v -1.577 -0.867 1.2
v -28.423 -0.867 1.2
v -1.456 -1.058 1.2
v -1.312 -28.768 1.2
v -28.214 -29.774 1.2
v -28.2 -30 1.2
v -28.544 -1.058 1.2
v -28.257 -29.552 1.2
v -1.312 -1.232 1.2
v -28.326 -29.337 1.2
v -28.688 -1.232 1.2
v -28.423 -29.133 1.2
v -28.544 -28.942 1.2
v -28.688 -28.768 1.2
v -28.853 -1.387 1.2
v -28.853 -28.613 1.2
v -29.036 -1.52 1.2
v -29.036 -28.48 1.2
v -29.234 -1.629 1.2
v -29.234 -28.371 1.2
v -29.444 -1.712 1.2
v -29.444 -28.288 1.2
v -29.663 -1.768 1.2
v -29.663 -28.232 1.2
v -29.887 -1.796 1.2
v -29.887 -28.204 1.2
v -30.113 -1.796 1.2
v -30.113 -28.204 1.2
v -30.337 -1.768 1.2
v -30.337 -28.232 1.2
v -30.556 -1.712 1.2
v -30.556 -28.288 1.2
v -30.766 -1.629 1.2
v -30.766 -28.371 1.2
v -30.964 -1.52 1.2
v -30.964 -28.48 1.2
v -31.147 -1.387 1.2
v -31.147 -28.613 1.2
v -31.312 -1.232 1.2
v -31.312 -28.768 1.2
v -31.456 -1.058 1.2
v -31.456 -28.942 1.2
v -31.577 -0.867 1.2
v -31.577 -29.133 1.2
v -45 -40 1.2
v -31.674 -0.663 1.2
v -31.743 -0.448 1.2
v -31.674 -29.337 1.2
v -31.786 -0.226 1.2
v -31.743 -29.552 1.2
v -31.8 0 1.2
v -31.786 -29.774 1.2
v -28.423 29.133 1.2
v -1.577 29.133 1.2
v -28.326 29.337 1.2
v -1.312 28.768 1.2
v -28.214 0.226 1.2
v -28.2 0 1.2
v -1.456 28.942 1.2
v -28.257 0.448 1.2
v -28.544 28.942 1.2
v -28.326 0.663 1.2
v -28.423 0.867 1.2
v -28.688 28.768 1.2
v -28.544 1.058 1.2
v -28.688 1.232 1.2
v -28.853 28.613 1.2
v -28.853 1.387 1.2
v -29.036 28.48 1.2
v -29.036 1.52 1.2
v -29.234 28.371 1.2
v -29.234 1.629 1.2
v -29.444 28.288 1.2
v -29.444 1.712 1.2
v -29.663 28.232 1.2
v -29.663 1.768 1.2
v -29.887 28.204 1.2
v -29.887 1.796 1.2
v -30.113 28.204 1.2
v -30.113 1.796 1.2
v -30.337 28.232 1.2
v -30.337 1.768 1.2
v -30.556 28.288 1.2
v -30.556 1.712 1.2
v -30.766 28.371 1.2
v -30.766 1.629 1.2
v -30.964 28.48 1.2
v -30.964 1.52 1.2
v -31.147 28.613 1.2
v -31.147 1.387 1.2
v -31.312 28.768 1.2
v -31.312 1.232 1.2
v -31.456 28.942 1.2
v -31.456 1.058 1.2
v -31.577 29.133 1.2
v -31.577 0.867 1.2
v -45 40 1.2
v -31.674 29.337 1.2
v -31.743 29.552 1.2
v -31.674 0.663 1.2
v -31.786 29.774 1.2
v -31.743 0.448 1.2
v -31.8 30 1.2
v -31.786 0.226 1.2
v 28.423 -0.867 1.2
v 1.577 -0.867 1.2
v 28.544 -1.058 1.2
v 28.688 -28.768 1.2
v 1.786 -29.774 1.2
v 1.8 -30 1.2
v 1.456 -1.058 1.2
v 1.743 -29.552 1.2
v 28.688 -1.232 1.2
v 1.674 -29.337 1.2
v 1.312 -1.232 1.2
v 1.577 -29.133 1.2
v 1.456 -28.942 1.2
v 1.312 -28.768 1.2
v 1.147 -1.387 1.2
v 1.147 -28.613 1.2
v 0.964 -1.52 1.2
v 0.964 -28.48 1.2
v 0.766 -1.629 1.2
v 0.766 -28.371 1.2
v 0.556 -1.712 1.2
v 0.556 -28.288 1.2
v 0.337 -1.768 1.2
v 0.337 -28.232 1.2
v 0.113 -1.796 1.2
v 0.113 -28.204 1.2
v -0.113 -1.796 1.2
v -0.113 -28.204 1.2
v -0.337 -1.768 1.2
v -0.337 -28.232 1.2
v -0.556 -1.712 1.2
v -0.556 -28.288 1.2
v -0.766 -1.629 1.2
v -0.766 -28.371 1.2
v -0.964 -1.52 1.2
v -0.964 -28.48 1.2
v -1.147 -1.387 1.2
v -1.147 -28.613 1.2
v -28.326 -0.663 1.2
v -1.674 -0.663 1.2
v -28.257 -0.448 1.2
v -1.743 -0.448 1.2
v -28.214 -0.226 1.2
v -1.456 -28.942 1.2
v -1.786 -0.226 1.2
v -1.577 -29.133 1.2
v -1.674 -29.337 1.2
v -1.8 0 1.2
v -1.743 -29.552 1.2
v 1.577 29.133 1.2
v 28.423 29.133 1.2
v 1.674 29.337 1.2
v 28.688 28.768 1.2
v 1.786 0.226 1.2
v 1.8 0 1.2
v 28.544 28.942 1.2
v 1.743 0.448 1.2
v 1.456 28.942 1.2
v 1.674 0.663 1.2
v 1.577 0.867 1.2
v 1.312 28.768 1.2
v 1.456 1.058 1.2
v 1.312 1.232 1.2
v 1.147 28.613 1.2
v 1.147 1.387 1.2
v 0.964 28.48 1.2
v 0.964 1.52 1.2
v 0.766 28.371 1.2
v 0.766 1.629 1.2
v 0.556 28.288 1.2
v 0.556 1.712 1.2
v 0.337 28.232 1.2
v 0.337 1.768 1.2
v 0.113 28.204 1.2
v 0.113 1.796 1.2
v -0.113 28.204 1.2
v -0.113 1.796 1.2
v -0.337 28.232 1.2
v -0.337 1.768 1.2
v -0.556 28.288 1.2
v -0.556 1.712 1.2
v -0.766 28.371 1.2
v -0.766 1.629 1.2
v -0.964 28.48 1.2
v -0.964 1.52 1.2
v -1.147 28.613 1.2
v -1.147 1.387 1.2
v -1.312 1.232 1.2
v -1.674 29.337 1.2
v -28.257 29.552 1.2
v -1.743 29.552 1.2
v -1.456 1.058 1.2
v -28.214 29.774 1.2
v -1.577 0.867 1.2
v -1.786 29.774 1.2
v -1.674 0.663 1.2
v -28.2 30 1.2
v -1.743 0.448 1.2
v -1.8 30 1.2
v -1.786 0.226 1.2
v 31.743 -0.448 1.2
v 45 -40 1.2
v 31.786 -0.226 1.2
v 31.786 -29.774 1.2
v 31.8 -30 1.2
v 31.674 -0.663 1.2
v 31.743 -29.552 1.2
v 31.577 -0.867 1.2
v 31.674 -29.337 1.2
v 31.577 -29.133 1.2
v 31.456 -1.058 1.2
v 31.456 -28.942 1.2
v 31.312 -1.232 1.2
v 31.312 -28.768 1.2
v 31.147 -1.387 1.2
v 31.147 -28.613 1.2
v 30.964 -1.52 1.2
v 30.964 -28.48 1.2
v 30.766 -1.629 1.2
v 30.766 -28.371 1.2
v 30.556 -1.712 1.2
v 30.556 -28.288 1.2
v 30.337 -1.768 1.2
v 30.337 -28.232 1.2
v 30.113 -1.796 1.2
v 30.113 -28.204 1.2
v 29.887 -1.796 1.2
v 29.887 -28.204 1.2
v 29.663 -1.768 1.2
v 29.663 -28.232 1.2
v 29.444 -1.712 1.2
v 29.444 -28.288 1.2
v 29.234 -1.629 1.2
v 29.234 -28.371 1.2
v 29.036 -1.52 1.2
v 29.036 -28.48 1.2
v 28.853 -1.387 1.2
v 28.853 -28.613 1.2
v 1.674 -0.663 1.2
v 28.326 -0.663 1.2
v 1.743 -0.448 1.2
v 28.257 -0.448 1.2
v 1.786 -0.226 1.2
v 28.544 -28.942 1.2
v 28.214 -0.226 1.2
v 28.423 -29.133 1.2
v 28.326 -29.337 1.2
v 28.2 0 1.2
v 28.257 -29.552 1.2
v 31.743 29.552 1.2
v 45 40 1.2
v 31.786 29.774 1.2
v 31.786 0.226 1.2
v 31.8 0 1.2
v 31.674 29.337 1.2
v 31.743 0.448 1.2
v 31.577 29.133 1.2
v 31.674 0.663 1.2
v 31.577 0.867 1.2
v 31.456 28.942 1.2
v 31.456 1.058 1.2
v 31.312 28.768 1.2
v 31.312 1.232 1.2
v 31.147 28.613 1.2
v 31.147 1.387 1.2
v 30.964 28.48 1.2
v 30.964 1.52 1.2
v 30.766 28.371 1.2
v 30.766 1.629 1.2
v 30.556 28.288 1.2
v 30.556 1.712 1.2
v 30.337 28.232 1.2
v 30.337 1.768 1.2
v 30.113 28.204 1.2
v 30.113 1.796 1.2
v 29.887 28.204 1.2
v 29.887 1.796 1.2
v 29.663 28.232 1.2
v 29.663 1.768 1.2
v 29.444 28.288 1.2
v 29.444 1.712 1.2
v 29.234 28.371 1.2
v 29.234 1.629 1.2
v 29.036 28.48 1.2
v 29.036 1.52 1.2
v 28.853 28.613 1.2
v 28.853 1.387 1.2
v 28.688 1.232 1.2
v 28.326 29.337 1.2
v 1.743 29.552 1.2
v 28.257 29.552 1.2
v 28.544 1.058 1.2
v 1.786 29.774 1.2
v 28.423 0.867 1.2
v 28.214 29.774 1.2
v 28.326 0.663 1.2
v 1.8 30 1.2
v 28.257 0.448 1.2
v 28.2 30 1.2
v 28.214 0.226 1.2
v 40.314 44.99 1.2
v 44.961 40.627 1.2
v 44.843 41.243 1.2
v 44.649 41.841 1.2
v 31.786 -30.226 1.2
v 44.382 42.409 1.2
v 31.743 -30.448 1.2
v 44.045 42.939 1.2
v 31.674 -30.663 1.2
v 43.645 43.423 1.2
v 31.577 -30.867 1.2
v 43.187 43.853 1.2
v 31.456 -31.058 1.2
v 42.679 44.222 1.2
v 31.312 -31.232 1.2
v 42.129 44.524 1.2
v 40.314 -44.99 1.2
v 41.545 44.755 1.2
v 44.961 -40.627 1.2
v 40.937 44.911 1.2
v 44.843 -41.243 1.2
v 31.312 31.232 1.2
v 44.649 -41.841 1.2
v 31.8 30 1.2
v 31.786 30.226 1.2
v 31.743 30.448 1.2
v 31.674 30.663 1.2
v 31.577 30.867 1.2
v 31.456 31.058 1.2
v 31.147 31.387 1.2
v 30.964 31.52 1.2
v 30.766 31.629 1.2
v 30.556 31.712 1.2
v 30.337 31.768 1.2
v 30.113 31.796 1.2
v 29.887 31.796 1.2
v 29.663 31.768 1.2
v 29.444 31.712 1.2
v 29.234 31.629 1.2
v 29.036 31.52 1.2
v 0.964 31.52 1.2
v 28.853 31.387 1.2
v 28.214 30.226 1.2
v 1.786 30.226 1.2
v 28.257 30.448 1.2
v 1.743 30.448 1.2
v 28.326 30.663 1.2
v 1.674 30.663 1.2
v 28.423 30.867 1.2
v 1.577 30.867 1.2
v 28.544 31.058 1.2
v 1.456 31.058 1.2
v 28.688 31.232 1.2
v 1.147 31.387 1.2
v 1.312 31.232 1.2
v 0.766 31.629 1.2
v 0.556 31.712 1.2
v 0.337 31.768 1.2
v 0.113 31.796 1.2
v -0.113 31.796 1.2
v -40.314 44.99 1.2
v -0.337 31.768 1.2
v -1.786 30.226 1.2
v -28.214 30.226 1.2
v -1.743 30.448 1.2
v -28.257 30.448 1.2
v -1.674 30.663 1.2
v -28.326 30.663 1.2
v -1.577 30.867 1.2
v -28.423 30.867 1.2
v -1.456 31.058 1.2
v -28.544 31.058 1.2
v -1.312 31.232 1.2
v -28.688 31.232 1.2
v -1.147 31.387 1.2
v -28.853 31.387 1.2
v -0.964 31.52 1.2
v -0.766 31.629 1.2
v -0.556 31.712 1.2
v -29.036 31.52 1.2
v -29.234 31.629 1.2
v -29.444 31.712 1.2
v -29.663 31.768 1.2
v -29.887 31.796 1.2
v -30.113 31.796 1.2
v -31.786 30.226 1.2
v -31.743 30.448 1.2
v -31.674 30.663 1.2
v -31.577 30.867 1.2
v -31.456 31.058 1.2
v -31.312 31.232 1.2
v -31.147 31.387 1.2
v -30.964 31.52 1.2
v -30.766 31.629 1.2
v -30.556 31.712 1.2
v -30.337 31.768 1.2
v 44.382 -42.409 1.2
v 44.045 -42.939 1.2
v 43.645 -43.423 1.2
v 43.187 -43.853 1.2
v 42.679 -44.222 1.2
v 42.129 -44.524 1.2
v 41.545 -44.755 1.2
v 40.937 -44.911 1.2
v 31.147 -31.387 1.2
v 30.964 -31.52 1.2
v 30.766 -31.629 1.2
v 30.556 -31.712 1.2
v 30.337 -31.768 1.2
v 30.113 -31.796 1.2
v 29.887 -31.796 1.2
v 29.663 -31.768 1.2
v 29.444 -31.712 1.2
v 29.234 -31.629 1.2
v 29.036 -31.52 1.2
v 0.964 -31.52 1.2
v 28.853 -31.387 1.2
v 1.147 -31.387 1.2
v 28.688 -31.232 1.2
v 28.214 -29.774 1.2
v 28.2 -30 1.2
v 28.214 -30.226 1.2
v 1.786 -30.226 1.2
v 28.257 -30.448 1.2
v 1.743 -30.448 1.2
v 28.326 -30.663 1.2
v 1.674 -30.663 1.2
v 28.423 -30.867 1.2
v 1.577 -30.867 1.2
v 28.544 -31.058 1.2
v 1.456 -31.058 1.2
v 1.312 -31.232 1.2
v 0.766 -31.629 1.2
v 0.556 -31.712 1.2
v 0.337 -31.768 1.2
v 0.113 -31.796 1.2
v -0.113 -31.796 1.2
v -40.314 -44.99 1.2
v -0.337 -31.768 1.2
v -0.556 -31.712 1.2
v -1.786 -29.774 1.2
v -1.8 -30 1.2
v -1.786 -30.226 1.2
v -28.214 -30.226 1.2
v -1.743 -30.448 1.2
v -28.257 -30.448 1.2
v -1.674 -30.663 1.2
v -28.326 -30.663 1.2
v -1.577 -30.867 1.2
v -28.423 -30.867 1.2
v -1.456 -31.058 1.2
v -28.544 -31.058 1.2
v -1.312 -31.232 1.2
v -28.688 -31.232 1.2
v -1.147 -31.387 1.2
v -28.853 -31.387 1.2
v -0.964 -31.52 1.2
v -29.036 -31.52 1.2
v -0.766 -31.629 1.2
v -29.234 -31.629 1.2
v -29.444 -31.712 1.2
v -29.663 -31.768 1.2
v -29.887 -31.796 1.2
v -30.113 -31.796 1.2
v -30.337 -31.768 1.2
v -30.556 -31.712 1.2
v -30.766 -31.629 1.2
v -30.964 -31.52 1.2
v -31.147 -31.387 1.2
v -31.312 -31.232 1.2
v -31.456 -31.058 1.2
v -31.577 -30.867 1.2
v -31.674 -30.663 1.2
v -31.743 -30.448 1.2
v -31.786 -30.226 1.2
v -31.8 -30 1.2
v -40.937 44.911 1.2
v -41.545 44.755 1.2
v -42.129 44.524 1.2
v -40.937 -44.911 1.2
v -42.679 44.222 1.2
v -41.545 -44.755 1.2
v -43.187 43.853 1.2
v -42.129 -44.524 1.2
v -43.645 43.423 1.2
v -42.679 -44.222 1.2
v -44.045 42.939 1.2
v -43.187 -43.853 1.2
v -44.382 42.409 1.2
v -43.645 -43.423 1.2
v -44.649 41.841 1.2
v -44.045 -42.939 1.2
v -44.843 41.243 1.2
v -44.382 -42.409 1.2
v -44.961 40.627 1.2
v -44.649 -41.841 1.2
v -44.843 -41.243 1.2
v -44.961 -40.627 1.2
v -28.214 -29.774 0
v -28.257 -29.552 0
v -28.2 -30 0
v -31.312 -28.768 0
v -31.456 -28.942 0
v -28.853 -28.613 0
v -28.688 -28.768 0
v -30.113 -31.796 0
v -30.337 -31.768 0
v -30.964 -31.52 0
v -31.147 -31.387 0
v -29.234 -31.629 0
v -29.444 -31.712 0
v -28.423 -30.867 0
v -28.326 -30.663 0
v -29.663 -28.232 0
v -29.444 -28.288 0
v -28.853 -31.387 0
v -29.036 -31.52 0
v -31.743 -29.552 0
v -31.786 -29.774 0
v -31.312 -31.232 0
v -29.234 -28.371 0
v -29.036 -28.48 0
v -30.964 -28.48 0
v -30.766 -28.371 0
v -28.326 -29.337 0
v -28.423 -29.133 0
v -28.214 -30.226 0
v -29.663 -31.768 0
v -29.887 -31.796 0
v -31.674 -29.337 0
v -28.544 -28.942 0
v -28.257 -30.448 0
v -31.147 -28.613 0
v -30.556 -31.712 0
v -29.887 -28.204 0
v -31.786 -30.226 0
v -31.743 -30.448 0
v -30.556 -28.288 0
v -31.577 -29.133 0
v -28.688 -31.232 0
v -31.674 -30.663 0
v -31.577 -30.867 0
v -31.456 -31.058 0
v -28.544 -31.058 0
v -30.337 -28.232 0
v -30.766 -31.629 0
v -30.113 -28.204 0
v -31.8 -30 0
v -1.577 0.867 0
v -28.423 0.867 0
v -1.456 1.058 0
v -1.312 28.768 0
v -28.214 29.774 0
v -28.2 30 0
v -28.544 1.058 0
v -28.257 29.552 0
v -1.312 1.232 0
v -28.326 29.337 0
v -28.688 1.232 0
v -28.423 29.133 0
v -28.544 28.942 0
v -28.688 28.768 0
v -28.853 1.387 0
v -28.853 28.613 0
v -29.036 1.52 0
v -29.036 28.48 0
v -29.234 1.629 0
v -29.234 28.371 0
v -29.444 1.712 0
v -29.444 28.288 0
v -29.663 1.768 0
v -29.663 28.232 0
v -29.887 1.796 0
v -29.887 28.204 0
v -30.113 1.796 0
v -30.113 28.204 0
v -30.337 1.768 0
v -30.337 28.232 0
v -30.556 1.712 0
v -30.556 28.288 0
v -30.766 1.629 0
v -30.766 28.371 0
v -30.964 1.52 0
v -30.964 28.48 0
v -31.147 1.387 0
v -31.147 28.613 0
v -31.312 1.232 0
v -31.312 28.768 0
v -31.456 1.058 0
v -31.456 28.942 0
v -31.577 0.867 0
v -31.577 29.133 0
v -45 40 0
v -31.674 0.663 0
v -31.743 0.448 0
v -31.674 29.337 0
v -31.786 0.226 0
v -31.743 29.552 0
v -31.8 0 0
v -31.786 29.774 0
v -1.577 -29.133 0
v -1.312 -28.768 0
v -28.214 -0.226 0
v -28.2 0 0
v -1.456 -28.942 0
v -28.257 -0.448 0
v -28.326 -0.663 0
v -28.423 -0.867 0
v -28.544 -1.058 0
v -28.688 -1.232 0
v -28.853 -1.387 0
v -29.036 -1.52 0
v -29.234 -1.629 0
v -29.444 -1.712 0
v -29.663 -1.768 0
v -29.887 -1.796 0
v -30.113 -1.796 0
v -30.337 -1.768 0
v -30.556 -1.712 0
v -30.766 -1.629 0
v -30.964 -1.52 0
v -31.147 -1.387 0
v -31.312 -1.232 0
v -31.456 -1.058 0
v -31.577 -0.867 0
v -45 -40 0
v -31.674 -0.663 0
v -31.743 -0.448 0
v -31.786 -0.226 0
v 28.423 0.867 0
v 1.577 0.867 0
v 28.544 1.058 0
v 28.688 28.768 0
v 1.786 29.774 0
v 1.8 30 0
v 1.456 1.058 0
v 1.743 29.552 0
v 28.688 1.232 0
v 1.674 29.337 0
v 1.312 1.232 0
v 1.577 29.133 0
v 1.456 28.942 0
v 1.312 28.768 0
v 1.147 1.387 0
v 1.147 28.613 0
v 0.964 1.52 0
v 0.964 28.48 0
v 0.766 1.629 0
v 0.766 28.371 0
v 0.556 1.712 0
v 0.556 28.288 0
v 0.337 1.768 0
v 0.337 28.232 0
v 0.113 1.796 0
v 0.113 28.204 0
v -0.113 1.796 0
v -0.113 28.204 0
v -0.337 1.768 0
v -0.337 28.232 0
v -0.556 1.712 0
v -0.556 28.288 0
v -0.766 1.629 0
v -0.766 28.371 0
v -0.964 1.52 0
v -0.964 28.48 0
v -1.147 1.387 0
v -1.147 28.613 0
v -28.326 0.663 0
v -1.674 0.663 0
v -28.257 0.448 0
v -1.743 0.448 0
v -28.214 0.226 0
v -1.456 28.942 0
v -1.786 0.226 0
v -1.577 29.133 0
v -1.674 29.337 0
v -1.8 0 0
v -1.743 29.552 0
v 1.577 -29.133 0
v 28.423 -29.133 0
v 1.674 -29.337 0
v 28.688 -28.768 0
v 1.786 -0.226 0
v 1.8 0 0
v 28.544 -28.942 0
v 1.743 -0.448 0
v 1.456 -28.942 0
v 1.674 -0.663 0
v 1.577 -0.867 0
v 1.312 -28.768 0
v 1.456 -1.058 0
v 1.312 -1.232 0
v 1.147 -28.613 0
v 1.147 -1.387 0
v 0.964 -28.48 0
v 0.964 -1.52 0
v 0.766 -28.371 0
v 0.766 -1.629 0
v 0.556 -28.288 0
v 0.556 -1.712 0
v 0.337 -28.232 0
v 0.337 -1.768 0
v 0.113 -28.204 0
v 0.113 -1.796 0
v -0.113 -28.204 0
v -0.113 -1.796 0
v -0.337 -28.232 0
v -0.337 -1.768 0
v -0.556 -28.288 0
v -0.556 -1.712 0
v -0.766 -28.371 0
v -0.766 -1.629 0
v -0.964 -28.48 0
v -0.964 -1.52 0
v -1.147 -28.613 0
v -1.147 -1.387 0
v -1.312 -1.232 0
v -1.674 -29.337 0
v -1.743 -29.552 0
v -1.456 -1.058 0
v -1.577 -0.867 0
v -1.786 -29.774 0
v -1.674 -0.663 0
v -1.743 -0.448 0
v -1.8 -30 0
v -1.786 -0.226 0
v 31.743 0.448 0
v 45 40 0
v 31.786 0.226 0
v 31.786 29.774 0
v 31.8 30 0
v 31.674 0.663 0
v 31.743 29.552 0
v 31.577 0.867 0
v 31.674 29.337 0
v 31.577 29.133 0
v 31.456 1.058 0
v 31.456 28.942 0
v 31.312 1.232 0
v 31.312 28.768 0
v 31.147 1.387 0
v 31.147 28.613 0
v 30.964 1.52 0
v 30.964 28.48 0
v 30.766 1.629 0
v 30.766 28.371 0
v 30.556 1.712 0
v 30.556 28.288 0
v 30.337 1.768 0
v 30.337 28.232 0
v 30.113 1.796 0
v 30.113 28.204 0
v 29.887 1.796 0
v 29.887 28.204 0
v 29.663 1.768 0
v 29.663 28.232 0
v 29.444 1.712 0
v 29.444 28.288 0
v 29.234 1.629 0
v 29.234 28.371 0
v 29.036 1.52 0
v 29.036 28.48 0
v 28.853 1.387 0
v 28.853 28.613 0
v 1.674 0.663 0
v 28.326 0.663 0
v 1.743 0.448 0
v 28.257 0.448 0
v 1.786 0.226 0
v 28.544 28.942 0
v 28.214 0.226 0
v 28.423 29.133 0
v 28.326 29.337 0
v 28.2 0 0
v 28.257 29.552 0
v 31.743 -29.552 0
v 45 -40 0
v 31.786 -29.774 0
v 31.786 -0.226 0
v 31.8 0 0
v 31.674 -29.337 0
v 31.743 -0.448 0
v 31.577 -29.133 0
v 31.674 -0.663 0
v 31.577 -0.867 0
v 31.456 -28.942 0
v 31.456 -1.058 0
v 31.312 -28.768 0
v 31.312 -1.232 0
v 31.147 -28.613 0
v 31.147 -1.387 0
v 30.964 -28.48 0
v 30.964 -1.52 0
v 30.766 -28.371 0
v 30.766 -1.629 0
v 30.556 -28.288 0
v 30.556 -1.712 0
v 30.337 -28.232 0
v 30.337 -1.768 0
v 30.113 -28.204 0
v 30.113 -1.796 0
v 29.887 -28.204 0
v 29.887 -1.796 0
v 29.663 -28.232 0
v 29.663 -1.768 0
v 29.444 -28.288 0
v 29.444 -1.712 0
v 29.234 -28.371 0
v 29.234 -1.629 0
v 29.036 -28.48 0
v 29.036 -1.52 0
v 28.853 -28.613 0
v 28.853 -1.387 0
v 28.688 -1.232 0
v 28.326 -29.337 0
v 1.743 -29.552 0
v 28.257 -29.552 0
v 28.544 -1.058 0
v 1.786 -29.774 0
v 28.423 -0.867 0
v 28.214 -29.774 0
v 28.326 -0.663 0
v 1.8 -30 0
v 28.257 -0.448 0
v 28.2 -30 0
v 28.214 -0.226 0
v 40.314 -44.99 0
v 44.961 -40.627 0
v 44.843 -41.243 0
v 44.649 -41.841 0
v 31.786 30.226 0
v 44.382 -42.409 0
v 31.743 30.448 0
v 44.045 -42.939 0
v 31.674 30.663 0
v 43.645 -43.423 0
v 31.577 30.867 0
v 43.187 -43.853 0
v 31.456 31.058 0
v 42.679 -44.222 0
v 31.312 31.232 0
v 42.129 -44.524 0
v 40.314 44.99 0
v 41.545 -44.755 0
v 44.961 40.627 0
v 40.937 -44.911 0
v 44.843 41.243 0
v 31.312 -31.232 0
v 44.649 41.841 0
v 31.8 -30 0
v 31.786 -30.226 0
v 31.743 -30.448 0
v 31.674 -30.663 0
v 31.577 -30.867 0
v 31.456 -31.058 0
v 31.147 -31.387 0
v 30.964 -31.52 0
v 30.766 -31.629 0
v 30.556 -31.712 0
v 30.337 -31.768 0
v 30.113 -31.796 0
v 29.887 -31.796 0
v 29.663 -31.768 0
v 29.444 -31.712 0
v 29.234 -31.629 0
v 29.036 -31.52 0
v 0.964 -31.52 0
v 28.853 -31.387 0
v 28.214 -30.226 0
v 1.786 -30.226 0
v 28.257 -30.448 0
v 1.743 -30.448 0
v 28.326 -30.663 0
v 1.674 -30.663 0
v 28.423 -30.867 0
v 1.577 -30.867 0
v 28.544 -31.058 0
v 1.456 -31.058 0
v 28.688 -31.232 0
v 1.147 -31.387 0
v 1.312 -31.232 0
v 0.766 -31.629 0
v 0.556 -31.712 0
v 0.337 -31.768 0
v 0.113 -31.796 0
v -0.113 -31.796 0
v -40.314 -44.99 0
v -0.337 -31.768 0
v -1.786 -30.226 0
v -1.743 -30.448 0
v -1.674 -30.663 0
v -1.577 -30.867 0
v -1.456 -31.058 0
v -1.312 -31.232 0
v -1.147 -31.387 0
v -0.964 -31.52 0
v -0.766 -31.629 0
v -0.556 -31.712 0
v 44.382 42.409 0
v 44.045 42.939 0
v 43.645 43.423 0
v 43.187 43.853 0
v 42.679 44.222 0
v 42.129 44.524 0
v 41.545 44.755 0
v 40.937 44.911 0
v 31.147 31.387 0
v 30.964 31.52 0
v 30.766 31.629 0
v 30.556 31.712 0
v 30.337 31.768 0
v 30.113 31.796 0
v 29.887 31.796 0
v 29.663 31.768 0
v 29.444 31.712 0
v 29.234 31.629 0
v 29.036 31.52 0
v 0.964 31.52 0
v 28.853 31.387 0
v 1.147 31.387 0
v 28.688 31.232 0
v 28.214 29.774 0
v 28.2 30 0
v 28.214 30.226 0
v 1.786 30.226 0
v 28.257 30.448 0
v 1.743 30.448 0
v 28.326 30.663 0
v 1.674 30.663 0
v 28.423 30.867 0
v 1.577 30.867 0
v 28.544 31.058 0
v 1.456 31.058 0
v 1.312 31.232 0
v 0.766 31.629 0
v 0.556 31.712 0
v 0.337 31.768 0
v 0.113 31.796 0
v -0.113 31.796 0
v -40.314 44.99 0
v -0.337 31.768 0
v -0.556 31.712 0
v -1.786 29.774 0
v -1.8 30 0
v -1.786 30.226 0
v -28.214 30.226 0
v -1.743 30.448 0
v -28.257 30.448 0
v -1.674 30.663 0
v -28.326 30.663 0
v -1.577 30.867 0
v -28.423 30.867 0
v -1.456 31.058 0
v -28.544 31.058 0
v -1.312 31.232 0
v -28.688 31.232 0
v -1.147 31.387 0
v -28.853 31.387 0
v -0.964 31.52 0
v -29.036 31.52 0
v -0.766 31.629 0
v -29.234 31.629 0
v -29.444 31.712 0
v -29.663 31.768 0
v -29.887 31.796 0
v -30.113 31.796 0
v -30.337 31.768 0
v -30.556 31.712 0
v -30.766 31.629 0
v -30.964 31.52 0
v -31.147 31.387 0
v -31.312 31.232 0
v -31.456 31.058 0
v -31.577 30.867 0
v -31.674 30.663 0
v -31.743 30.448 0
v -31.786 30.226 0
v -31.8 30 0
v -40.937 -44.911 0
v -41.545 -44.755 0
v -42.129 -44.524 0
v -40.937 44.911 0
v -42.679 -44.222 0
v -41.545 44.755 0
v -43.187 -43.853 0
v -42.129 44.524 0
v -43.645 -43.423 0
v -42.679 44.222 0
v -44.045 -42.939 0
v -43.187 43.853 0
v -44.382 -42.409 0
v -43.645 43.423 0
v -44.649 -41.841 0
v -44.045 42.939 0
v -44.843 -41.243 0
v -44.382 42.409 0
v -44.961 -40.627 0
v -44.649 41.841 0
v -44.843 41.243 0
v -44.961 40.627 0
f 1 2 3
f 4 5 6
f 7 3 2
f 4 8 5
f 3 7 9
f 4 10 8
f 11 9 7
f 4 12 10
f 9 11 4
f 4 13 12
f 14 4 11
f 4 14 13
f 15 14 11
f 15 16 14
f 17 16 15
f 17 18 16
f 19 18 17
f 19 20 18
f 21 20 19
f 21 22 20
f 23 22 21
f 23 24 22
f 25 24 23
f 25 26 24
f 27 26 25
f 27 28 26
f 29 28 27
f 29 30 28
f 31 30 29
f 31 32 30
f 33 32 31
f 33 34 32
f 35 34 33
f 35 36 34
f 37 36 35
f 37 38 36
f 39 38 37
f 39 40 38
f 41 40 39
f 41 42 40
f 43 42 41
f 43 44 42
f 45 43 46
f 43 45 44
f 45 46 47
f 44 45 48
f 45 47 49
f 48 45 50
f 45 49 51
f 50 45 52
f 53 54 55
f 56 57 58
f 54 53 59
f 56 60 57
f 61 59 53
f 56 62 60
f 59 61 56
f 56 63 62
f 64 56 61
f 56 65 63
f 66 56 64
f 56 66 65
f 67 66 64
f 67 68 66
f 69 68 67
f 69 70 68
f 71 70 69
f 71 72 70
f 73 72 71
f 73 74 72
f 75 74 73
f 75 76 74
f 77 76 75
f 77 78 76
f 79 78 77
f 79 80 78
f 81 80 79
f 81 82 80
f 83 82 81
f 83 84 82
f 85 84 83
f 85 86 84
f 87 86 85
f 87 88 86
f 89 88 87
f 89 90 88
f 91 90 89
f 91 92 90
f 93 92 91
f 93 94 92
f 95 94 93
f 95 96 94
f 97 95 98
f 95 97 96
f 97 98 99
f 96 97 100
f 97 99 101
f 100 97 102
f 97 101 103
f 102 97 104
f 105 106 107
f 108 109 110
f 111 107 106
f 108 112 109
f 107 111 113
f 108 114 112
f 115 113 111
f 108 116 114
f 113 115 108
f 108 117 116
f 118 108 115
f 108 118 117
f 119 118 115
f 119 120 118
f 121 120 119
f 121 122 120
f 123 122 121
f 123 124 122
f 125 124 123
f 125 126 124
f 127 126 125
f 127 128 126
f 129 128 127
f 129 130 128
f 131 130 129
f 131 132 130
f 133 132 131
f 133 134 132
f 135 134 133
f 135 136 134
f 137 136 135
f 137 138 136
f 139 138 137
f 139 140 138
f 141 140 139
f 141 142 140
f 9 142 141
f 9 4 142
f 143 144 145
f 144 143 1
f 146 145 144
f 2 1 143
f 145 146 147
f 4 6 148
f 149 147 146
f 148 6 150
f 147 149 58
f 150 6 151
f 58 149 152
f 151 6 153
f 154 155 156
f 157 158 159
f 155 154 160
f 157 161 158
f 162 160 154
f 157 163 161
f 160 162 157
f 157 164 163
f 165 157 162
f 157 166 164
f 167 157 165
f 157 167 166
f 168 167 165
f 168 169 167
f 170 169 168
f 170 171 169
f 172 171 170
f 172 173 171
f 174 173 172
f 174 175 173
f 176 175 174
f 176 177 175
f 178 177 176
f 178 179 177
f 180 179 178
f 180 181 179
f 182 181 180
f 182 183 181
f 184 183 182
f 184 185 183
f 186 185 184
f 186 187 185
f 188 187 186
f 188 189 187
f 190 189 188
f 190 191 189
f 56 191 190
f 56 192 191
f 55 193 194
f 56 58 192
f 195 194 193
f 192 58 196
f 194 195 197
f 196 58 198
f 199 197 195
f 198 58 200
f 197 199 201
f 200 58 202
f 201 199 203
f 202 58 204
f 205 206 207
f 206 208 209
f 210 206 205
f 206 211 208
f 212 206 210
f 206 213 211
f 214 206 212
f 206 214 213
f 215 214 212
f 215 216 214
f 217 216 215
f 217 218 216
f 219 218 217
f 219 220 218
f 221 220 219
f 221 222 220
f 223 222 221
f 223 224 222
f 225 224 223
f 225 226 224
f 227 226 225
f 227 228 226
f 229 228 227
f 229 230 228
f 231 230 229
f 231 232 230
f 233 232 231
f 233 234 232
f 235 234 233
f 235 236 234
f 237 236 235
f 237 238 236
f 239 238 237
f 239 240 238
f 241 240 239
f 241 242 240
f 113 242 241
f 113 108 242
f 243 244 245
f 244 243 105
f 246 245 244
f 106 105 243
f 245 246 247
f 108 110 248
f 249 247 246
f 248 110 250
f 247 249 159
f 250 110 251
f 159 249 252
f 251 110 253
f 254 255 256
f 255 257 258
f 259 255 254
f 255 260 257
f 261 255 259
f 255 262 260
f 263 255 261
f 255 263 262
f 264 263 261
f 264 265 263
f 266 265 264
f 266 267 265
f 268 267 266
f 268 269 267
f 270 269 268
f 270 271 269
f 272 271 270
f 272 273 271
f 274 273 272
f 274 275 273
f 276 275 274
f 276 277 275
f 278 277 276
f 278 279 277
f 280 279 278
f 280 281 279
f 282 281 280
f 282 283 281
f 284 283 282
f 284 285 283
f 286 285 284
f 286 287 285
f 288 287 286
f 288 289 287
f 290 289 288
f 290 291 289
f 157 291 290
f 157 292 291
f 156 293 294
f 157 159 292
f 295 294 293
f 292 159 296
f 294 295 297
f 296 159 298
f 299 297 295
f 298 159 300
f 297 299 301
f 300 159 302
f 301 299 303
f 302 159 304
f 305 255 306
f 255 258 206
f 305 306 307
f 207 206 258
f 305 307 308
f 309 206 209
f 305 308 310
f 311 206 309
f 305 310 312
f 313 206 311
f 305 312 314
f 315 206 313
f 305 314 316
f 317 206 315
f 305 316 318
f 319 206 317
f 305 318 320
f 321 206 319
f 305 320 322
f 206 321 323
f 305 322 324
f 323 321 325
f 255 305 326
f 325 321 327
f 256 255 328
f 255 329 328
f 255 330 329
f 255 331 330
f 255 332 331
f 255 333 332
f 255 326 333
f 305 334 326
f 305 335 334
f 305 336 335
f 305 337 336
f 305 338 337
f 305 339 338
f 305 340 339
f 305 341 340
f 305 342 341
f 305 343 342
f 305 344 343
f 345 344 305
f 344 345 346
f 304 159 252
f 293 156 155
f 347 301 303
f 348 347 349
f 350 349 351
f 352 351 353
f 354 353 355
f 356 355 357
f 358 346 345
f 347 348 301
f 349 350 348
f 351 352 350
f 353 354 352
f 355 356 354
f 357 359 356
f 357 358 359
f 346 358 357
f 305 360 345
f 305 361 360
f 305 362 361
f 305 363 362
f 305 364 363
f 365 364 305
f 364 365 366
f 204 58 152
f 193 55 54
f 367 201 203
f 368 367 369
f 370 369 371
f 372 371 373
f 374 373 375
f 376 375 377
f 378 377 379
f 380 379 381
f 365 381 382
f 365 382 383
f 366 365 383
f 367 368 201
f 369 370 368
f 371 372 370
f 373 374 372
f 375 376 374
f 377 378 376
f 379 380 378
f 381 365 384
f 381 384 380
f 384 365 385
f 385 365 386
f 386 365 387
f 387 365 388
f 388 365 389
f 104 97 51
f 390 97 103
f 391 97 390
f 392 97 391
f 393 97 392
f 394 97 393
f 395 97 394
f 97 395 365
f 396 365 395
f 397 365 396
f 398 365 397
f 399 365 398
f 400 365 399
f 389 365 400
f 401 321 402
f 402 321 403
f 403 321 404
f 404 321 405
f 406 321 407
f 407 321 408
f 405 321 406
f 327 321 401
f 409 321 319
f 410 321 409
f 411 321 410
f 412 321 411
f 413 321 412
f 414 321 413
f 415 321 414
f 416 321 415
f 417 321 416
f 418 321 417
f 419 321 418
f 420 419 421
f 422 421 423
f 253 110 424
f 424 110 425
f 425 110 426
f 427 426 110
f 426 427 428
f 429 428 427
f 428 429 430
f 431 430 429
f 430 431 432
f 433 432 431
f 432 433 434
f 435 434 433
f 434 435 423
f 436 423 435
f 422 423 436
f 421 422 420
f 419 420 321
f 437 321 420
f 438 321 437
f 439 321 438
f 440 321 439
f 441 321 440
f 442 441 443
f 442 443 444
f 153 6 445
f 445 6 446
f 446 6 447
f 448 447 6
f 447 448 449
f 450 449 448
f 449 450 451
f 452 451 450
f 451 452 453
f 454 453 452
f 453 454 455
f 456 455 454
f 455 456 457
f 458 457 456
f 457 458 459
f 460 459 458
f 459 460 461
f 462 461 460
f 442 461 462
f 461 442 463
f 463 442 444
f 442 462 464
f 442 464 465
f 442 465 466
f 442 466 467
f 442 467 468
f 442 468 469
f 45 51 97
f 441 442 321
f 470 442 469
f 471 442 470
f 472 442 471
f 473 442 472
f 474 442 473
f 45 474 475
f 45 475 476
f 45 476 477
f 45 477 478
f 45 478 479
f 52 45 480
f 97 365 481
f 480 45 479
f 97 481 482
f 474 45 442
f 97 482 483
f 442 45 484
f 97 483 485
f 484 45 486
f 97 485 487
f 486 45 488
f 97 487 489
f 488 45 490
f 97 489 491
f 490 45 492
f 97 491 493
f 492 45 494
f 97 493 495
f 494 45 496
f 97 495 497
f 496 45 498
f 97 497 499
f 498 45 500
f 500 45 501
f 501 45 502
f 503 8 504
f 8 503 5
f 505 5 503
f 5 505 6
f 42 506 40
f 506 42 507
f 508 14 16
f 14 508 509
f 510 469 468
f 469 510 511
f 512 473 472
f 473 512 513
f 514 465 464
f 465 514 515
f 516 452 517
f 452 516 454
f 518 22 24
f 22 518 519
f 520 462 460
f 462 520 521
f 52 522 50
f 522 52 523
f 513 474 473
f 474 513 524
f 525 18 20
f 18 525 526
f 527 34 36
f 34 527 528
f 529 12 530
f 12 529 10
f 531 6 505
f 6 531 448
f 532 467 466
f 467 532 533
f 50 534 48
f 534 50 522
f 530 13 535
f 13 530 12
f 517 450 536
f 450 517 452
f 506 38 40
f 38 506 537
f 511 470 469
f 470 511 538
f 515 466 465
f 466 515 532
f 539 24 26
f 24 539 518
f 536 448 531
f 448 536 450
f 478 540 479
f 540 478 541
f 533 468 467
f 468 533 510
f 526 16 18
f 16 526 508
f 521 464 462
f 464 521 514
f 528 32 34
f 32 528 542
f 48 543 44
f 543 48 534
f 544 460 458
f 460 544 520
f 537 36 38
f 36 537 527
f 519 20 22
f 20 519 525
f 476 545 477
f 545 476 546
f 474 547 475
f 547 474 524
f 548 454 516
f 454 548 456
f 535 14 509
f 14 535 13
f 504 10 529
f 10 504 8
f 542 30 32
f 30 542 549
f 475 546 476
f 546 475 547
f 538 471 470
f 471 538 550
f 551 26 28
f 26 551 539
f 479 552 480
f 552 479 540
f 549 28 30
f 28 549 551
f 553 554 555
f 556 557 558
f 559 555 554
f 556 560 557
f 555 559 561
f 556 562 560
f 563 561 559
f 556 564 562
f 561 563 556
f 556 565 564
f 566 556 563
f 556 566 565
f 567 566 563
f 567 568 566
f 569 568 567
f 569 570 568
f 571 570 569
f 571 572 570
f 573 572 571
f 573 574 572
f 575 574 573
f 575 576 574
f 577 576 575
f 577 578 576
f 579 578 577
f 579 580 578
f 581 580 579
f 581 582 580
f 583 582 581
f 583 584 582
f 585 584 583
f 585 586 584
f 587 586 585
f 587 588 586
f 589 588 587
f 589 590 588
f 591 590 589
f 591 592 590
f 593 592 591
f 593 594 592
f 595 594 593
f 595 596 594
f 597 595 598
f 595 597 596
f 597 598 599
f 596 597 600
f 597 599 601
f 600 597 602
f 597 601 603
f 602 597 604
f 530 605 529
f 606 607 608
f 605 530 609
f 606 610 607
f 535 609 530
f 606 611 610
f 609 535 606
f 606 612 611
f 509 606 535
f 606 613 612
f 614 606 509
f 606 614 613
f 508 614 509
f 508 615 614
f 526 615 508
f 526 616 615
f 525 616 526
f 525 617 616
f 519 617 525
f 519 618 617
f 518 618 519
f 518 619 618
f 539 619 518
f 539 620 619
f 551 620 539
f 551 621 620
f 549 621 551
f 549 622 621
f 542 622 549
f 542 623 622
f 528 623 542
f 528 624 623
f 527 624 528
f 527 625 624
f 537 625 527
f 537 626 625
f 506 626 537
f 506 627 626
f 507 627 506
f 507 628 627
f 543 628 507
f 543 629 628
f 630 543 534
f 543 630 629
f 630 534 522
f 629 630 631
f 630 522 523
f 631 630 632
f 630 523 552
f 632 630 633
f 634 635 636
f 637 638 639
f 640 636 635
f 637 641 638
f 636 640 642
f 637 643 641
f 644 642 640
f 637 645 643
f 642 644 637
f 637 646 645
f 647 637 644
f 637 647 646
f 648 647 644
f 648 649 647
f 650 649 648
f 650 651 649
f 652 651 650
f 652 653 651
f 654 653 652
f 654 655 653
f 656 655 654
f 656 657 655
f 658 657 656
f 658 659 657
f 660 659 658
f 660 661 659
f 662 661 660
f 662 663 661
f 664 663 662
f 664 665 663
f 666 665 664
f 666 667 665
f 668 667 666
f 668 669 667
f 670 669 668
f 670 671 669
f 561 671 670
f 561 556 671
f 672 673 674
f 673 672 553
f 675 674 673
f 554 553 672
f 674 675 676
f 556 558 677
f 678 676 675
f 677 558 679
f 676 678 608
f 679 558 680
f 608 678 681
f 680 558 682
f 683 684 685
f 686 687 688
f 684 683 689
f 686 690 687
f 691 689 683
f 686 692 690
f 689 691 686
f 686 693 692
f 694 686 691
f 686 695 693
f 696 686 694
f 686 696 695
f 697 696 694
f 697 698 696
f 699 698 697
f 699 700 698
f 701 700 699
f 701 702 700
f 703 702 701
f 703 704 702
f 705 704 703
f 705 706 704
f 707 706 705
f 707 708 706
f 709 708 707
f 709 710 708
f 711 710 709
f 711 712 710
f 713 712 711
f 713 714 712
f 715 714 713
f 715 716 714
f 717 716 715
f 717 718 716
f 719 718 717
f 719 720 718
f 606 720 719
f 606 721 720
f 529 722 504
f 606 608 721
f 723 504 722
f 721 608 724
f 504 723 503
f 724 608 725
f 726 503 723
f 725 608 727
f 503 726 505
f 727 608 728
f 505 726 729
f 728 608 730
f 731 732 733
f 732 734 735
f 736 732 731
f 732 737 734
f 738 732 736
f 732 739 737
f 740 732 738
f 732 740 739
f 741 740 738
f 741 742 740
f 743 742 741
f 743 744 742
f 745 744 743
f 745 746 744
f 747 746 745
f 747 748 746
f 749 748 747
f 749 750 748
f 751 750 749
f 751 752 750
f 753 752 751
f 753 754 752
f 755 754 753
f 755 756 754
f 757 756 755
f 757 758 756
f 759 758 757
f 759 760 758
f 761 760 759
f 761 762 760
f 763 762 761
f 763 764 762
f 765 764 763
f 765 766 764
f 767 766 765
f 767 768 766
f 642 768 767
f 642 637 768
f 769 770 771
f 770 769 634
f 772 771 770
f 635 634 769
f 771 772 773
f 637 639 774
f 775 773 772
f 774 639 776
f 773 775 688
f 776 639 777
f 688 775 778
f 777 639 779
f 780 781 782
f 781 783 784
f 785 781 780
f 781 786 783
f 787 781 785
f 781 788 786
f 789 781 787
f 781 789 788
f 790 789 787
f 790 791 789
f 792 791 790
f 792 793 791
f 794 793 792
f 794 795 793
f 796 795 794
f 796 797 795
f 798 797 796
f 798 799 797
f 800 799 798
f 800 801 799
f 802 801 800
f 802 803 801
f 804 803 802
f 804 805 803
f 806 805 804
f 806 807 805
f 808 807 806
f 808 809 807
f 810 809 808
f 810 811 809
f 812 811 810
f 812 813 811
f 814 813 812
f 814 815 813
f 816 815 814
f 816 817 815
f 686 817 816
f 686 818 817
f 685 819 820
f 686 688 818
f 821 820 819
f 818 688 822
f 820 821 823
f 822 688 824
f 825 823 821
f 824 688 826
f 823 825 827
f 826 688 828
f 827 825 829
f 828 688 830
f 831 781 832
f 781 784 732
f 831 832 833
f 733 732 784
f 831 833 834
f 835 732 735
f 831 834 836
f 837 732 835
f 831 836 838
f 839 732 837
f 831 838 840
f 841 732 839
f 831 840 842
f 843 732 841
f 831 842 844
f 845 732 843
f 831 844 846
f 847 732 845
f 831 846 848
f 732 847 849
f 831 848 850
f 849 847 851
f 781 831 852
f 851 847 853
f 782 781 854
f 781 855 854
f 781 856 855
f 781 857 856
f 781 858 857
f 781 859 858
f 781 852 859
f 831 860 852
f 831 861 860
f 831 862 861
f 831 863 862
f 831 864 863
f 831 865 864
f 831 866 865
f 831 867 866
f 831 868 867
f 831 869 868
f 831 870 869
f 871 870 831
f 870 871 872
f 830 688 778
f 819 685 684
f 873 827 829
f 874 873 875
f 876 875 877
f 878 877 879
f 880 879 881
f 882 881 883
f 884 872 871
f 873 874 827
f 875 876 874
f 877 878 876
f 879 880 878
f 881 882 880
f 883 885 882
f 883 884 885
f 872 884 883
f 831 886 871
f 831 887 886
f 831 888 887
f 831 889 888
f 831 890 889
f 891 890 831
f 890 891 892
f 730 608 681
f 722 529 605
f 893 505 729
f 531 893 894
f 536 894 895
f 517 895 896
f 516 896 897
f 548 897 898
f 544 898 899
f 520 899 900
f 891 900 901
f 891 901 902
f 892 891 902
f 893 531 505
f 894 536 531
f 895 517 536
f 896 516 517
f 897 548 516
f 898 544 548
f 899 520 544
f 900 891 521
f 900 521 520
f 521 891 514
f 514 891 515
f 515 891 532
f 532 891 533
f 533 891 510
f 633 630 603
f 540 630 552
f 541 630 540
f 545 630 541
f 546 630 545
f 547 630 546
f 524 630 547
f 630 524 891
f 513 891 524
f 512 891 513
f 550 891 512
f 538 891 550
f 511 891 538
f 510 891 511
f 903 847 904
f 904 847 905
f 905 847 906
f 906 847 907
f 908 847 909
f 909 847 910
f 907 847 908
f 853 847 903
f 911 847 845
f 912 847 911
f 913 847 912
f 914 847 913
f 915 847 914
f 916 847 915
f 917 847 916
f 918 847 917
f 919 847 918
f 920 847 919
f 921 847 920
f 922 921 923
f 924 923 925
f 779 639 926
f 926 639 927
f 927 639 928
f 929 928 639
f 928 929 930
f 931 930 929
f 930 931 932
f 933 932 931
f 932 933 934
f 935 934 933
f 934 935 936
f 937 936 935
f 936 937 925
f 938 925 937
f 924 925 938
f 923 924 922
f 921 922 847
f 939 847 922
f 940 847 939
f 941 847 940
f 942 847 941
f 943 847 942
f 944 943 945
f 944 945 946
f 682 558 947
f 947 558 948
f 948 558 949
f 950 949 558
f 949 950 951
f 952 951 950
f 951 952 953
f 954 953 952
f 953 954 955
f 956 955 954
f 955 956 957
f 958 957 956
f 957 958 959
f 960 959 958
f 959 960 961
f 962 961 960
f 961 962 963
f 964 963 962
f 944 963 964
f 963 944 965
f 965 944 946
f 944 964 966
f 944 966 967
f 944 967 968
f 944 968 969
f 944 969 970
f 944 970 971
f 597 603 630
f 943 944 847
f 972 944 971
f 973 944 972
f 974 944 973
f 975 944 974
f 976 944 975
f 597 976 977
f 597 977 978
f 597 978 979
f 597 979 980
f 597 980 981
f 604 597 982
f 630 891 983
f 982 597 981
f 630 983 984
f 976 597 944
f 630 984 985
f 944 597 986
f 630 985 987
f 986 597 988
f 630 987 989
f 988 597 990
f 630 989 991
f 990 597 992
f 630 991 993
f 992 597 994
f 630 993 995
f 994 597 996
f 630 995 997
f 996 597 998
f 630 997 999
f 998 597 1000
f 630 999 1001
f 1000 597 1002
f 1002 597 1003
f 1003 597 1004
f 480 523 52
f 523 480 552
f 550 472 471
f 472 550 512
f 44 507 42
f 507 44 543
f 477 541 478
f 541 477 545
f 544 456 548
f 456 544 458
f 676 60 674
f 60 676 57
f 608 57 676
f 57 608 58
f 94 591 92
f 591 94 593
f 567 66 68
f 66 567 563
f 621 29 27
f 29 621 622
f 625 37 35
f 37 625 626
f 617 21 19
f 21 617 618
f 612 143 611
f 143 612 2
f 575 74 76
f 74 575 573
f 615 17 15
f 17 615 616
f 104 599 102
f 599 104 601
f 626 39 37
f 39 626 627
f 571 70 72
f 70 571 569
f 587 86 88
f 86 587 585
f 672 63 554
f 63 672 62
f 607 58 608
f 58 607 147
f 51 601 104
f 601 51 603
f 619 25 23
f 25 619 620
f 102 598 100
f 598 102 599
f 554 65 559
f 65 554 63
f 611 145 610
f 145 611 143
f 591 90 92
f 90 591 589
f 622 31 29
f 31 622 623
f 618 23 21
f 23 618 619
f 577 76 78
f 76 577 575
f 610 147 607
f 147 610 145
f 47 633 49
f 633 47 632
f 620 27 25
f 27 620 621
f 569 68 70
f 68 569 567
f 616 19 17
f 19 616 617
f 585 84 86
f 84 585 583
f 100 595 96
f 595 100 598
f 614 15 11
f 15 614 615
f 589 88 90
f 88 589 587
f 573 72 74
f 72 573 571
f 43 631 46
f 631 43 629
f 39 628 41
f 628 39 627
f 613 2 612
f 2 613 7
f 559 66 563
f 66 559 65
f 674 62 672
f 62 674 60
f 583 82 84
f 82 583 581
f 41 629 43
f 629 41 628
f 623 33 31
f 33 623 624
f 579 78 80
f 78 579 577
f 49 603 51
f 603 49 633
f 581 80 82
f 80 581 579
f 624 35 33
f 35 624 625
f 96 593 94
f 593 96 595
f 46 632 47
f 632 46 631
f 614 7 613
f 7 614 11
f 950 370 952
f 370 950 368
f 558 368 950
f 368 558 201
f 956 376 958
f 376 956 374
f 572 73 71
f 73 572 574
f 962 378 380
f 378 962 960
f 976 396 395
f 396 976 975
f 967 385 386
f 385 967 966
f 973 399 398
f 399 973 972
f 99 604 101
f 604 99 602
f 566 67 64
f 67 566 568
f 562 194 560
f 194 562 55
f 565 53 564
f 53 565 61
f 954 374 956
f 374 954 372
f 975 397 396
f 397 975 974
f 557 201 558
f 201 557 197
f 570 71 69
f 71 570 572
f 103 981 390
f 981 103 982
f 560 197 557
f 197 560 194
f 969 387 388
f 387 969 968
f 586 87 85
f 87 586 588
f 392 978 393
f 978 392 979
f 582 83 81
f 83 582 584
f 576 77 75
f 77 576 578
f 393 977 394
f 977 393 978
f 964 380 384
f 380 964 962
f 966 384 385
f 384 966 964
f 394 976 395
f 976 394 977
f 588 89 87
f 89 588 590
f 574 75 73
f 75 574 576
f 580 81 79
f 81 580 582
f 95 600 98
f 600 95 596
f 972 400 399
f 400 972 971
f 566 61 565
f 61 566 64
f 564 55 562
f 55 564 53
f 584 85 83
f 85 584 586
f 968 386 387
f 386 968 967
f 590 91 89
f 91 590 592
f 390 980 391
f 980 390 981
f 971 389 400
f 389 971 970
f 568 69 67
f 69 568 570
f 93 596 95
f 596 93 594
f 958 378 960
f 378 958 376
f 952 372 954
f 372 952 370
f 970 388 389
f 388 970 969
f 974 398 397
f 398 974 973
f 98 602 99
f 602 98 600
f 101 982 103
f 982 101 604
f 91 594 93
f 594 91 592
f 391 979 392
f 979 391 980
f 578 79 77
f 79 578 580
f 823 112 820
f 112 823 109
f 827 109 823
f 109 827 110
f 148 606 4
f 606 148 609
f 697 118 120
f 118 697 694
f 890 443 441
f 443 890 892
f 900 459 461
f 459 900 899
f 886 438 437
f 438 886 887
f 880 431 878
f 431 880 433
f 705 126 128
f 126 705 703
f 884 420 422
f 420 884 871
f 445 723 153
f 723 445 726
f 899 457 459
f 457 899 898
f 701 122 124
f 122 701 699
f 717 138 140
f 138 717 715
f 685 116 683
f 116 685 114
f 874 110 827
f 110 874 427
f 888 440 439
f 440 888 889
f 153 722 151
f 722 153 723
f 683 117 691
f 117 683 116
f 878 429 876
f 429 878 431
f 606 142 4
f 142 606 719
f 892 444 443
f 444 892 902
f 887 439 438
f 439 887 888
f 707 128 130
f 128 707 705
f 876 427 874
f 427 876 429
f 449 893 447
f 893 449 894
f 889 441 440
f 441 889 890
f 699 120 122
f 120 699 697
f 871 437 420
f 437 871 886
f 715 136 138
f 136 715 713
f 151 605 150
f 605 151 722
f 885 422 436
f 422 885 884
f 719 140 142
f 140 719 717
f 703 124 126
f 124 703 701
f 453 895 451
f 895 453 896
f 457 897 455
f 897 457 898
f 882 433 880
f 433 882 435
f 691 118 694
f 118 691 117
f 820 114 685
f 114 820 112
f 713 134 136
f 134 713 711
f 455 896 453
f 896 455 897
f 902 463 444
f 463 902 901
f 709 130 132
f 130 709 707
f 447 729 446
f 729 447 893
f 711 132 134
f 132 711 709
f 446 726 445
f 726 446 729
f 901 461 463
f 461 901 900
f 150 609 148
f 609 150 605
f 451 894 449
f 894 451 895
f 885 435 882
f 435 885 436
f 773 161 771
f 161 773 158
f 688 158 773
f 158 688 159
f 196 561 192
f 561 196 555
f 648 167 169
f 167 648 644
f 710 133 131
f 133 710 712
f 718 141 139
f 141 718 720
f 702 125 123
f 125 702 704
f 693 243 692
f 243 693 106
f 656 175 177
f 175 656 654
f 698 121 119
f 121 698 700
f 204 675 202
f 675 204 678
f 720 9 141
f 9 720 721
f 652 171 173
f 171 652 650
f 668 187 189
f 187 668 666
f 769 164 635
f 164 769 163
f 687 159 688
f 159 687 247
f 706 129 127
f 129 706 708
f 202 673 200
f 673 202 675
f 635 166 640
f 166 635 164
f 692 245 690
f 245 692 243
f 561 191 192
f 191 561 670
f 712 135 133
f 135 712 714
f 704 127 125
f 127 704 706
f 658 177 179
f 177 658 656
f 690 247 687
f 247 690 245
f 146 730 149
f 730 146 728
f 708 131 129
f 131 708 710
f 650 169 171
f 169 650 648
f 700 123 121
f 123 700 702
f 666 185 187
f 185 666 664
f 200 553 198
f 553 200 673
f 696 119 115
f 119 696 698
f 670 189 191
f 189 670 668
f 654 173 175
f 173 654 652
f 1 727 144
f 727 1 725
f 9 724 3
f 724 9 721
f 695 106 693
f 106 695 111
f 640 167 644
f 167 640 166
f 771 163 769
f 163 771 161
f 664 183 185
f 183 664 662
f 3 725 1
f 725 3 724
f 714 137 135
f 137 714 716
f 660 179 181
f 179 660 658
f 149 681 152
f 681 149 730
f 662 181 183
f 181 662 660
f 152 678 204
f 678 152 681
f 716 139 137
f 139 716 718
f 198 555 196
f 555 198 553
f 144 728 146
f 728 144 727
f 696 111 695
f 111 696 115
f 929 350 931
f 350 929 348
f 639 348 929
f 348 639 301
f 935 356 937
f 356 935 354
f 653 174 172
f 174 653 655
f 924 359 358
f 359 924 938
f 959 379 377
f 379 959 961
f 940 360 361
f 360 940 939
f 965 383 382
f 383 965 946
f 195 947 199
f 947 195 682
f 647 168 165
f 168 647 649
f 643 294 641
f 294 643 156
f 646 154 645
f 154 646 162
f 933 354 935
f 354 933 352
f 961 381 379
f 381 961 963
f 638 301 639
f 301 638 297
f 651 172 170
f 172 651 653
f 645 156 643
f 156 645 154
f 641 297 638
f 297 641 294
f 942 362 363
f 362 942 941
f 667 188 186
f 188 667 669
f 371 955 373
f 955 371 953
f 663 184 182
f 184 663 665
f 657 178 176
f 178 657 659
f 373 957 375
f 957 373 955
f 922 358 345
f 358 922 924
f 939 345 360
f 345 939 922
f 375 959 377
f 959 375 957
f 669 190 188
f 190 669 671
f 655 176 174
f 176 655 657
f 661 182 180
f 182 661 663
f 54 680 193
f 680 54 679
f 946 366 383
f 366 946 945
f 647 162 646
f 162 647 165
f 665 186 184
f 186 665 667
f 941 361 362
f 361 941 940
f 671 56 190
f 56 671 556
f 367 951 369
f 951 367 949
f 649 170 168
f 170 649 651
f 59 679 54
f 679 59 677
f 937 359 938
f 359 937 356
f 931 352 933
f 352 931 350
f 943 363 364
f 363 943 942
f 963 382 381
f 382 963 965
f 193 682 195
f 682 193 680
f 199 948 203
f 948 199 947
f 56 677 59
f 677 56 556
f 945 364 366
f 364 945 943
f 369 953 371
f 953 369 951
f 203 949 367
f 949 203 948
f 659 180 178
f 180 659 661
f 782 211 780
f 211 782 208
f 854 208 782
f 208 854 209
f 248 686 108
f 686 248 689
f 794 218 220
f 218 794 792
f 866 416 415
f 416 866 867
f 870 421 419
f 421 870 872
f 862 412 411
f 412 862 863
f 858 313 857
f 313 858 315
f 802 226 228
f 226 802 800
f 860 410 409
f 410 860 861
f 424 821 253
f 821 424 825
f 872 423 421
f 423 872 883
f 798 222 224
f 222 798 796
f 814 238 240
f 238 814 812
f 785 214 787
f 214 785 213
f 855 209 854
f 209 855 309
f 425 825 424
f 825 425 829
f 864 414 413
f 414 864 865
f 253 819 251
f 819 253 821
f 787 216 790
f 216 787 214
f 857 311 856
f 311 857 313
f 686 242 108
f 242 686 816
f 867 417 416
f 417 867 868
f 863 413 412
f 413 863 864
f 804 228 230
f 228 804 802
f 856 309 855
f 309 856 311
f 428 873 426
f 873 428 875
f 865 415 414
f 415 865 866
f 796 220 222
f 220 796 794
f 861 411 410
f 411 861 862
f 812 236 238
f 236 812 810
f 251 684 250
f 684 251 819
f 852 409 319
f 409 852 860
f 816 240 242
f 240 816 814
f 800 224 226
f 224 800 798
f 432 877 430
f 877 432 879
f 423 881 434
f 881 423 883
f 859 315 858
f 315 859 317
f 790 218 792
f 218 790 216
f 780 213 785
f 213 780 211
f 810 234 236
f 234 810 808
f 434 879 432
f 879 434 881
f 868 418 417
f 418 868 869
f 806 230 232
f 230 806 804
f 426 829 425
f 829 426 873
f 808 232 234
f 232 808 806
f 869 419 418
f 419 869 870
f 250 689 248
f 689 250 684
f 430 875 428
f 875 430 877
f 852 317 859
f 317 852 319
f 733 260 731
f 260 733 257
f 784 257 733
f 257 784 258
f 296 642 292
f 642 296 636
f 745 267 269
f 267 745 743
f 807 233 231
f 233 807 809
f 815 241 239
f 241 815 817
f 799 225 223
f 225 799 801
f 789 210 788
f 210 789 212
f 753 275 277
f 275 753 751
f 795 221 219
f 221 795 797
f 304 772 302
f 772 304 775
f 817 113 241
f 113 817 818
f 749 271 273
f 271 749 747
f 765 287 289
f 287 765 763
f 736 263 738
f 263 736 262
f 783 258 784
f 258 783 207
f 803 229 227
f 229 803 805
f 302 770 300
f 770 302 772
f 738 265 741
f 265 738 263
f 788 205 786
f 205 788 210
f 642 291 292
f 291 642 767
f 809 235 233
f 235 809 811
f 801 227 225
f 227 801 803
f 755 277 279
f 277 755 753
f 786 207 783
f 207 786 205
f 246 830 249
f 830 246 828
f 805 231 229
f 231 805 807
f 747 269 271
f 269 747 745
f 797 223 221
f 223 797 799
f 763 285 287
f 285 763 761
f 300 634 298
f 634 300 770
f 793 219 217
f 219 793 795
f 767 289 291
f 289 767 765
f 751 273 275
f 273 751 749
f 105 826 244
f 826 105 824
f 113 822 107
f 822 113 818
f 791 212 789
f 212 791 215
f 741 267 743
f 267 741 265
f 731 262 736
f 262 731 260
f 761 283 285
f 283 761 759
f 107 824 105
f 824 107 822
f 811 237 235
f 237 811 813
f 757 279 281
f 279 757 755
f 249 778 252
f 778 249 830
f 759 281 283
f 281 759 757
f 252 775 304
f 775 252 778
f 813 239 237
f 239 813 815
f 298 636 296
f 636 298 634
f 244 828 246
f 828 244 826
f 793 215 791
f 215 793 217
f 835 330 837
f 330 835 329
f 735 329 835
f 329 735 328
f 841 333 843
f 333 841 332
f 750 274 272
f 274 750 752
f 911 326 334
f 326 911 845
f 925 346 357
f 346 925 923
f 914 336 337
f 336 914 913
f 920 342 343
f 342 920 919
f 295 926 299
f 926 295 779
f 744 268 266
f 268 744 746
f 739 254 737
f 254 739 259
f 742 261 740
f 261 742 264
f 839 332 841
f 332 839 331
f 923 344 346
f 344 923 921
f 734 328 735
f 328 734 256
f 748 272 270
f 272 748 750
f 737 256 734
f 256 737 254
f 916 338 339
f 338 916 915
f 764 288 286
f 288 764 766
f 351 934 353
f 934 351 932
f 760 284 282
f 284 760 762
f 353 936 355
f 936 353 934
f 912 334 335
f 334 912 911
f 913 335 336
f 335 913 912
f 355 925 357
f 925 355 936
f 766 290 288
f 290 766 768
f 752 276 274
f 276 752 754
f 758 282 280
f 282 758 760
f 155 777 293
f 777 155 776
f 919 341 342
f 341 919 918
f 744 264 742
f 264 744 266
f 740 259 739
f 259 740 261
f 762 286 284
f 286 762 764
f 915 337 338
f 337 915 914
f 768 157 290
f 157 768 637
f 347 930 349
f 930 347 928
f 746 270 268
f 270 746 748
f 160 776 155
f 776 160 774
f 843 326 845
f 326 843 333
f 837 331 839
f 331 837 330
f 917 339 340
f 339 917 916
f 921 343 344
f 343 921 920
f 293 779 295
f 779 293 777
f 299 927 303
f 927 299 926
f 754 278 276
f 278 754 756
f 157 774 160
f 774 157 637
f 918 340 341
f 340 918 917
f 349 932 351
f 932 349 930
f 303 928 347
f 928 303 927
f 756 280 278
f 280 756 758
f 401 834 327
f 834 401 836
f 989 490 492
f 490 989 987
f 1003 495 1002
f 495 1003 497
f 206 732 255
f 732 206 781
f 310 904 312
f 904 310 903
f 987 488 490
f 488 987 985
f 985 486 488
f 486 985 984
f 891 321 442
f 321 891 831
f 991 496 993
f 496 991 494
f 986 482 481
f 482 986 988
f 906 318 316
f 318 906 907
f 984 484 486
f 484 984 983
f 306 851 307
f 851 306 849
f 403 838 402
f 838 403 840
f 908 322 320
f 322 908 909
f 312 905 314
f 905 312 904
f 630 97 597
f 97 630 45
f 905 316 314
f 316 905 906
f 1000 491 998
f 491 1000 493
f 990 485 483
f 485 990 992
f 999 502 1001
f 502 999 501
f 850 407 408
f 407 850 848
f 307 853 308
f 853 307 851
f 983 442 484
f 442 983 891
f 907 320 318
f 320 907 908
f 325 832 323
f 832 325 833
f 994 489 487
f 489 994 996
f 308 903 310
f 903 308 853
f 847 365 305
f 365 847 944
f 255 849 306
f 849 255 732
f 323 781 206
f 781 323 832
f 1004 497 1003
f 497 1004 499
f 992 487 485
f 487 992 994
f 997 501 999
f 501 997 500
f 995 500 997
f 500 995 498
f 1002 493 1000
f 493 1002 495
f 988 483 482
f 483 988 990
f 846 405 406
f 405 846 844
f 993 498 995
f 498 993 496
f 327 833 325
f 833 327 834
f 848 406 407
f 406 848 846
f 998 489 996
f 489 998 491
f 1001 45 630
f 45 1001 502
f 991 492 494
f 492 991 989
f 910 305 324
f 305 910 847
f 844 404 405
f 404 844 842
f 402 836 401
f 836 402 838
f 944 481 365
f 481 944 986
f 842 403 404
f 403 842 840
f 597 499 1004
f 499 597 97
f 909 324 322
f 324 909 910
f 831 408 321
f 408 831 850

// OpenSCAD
$fn = 50;


difference() {
	union() {
		hull() {
			translate(v = [-40.0000000000, 40.0000000000, 0]) {
				cylinder(h = 21, r = 5);
			}
			translate(v = [40.0000000000, 40.0000000000, 0]) {
				cylinder(h = 21, r = 5);
			}
			translate(v = [-40.0000000000, -40.0000000000, 0]) {
				cylinder(h = 21, r = 5);
			}
			translate(v = [40.0000000000, -40.0000000000, 0]) {
				cylinder(h = 21, r = 5);
			}
		}
	}
	union() {
		translate(v = [0, 0, 1.2000000000]) {
			hull() {
				translate(v = [-40.0000000000, 40.0000000000, 0]) {
					cylinder(h = 19.8000000000, r = 3.8000000000);
				}
				translate(v = [40.0000000000, 40.0000000000, 0]) {
					cylinder(h = 19.8000000000, r = 3.8000000000);
				}
				translate(v = [-40.0000000000, -40.0000000000, 0]) {
					cylinder(h = 19.8000000000, r = 3.8000000000);
				}
				translate(v = [40.0000000000, -40.0000000000, 0]) {
					cylinder(h = 19.8000000000, r = 3.8000000000);
				}
			}
		}
		#translate(v = [-30.0000000000, -30.0000000000, 0]) {
			cylinder(h = 1.2000000000, r = 1.8000000000);
		}
		#translate(v = [-30.0000000000, 0.0000000000, 0]) {
			cylinder(h = 1.2000000000, r = 1.8000000000);
		}
		#translate(v = [-30.0000000000, 30.0000000000, 0]) {
			cylinder(h = 1.2000000000, r = 1.8000000000);
		}
		#translate(v = [0.0000000000, -30.0000000000, 0]) {
			cylinder(h = 1.2000000000, r = 1.8000000000);
		}
		#cylinder(h = 1.2000000000, r = 1.8000000000);
		#translate(v = [0.0000000000, 30.0000000000, 0]) {
			cylinder(h = 1.2000000000, r = 1.8000000000);
		}
		#translate(v = [30.0000000000, -30.0000000000, 0]) {
			cylinder(h = 1.2000000000, r = 1.8000000000);
		}
		#translate(v = [30.0000000000, 0.0000000000, 0]) {
			cylinder(h = 1.2000000000, r = 1.8000000000);
		}
		#translate(v = [30.0000000000, 30.0000000000, 0]) {
			cylinder(h = 1.2000000000, r = 1.8000000000);
		}
		translate(v = [-250.0000000000, -250.0000000000, 1.2000000000]) {
			cube(size = [500, 500, 500]);
		}
		translate(v = [-250.0000000000, -250.0000000000, 1.2000000000]) {
			cube(size = [500, 500, 500]);
		}
		translate(v = [-250.0000000000, -250.0000000000, 1.2000000000]) {
			cube(size = [500, 500, 500]);
		}
	}
}
